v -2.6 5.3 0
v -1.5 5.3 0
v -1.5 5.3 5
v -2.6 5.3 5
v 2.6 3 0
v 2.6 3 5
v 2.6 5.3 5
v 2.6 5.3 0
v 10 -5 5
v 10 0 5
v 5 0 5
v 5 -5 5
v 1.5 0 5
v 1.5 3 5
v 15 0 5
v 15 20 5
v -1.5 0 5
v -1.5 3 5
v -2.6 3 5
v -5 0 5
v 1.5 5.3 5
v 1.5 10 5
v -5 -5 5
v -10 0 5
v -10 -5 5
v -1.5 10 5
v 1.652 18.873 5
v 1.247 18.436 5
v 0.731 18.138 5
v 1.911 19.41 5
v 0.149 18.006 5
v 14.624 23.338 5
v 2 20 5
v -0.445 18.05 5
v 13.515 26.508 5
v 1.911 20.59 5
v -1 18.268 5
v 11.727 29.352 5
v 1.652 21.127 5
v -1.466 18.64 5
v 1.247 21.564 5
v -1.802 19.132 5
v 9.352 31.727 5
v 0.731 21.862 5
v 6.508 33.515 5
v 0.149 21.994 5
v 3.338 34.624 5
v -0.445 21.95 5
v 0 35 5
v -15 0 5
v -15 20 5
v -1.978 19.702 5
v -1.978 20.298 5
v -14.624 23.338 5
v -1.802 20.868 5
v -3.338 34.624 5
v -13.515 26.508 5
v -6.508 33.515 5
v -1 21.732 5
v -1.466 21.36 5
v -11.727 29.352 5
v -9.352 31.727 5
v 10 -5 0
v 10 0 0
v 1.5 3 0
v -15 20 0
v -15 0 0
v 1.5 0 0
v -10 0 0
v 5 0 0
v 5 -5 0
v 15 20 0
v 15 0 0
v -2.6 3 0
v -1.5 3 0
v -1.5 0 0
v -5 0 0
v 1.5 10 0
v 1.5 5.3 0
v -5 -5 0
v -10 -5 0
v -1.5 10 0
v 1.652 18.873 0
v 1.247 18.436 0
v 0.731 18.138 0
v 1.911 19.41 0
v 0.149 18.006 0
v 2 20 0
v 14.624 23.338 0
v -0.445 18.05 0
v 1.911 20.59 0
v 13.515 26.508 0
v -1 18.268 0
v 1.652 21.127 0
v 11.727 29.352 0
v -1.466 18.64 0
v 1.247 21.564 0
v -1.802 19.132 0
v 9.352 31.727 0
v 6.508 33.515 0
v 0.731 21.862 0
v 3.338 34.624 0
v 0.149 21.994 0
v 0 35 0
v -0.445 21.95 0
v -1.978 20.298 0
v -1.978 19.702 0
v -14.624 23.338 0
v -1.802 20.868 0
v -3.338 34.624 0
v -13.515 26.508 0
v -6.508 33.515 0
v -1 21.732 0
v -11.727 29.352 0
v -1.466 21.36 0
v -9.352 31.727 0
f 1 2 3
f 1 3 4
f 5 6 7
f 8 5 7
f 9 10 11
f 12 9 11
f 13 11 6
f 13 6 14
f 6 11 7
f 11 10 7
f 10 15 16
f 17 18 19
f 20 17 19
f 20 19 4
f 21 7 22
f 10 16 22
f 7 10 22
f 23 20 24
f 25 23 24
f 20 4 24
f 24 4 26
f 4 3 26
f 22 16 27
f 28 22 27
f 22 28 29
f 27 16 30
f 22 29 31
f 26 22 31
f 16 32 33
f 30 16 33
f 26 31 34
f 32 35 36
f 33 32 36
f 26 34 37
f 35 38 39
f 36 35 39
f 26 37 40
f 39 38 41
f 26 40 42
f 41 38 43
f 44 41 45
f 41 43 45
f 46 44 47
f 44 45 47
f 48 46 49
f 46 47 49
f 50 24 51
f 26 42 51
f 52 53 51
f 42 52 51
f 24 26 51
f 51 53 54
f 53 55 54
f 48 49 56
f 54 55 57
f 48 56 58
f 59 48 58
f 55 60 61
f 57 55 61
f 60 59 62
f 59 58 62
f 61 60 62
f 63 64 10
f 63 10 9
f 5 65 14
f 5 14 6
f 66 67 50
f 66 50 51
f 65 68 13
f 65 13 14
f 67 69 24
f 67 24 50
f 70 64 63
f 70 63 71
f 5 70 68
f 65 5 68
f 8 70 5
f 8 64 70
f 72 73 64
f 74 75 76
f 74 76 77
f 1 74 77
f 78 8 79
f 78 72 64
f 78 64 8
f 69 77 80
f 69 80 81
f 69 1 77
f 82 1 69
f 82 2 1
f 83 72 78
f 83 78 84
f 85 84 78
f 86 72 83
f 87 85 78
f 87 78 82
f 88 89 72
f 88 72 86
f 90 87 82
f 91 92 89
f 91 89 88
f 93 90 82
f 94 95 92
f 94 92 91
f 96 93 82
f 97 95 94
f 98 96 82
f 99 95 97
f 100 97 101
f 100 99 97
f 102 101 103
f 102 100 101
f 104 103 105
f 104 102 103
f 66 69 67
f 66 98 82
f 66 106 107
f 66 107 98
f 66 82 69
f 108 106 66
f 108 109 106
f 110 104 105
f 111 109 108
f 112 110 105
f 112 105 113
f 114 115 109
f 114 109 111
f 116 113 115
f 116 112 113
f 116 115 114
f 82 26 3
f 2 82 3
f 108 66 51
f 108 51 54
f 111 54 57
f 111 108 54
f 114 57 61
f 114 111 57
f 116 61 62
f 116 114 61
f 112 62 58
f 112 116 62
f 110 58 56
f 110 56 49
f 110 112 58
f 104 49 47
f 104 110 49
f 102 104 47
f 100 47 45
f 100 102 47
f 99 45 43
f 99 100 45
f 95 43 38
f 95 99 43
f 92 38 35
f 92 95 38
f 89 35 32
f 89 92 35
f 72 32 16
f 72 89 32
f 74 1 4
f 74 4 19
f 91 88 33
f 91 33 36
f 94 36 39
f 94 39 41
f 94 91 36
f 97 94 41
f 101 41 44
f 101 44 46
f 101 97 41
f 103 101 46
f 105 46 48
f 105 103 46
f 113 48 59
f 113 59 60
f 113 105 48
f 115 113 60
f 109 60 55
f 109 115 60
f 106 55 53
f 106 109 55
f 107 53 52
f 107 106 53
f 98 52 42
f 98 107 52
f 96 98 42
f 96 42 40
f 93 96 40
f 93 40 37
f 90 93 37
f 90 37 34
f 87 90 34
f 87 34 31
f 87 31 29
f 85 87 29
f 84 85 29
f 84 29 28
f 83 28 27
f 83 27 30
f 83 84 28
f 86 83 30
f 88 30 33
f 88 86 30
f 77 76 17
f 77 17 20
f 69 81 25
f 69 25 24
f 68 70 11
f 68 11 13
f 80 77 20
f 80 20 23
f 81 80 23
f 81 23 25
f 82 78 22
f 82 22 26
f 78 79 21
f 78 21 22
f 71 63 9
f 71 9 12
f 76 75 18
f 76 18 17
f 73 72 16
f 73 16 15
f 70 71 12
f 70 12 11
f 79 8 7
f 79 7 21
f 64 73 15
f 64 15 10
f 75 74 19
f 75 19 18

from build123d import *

# Parameters (mm, degrees)
SKETCH1_R           = 2
BOSS_EXTRUDE1_DEPTH = 5


with BuildPart() as part:
    # Sketch1 → Boss-Extrude1 (new body)
    with BuildSketch(Plane.XY):
        with BuildLine():
            Line((-10, 0), (-15, 0))
            Line((-15, 0), (-15, 20))
            ThreePointArc((-15, 20), (0, 35), (15, 20))
            Line((15, 20), (15, 0))
            Line((15, 0), (10, 0))
            Line((10, 0), (10, -5))
            Line((10, -5), (5, -5))
            Line((5, -5), (5, 0))
            Line((5, 0), (1.5, 0))
            Line((1.5, 0), (1.5, 3))
            Line((1.5, 3), (2.6, 3))
            Line((2.6, 3), (2.6, 5.3))
            Line((2.6, 5.3), (1.5, 5.3))
            Line((1.5, 5.3), (1.5, 10))
            Line((1.5, 10), (-1.5, 10))
            Line((-1.5, 10), (-1.5, 5.3))
            Line((-1.5, 5.3), (-2.6, 5.3))
            Line((-2.6, 5.3), (-2.6, 3))
            Line((-2.6, 3), (-1.5, 3))
            Line((-1.5, 3), (-1.5, 0))
            Line((-1.5, 0), (-5, 0))
            Line((-5, 0), (-5, -5))
            Line((-5, -5), (-10, -5))
            Line((-10, -5), (-10, 0))
        make_face()
        with Locations((0, 20)):
            Circle(SKETCH1_R, mode=Mode.SUBTRACT)
    extrude(amount=BOSS_EXTRUDE1_DEPTH)


solid = part.part
